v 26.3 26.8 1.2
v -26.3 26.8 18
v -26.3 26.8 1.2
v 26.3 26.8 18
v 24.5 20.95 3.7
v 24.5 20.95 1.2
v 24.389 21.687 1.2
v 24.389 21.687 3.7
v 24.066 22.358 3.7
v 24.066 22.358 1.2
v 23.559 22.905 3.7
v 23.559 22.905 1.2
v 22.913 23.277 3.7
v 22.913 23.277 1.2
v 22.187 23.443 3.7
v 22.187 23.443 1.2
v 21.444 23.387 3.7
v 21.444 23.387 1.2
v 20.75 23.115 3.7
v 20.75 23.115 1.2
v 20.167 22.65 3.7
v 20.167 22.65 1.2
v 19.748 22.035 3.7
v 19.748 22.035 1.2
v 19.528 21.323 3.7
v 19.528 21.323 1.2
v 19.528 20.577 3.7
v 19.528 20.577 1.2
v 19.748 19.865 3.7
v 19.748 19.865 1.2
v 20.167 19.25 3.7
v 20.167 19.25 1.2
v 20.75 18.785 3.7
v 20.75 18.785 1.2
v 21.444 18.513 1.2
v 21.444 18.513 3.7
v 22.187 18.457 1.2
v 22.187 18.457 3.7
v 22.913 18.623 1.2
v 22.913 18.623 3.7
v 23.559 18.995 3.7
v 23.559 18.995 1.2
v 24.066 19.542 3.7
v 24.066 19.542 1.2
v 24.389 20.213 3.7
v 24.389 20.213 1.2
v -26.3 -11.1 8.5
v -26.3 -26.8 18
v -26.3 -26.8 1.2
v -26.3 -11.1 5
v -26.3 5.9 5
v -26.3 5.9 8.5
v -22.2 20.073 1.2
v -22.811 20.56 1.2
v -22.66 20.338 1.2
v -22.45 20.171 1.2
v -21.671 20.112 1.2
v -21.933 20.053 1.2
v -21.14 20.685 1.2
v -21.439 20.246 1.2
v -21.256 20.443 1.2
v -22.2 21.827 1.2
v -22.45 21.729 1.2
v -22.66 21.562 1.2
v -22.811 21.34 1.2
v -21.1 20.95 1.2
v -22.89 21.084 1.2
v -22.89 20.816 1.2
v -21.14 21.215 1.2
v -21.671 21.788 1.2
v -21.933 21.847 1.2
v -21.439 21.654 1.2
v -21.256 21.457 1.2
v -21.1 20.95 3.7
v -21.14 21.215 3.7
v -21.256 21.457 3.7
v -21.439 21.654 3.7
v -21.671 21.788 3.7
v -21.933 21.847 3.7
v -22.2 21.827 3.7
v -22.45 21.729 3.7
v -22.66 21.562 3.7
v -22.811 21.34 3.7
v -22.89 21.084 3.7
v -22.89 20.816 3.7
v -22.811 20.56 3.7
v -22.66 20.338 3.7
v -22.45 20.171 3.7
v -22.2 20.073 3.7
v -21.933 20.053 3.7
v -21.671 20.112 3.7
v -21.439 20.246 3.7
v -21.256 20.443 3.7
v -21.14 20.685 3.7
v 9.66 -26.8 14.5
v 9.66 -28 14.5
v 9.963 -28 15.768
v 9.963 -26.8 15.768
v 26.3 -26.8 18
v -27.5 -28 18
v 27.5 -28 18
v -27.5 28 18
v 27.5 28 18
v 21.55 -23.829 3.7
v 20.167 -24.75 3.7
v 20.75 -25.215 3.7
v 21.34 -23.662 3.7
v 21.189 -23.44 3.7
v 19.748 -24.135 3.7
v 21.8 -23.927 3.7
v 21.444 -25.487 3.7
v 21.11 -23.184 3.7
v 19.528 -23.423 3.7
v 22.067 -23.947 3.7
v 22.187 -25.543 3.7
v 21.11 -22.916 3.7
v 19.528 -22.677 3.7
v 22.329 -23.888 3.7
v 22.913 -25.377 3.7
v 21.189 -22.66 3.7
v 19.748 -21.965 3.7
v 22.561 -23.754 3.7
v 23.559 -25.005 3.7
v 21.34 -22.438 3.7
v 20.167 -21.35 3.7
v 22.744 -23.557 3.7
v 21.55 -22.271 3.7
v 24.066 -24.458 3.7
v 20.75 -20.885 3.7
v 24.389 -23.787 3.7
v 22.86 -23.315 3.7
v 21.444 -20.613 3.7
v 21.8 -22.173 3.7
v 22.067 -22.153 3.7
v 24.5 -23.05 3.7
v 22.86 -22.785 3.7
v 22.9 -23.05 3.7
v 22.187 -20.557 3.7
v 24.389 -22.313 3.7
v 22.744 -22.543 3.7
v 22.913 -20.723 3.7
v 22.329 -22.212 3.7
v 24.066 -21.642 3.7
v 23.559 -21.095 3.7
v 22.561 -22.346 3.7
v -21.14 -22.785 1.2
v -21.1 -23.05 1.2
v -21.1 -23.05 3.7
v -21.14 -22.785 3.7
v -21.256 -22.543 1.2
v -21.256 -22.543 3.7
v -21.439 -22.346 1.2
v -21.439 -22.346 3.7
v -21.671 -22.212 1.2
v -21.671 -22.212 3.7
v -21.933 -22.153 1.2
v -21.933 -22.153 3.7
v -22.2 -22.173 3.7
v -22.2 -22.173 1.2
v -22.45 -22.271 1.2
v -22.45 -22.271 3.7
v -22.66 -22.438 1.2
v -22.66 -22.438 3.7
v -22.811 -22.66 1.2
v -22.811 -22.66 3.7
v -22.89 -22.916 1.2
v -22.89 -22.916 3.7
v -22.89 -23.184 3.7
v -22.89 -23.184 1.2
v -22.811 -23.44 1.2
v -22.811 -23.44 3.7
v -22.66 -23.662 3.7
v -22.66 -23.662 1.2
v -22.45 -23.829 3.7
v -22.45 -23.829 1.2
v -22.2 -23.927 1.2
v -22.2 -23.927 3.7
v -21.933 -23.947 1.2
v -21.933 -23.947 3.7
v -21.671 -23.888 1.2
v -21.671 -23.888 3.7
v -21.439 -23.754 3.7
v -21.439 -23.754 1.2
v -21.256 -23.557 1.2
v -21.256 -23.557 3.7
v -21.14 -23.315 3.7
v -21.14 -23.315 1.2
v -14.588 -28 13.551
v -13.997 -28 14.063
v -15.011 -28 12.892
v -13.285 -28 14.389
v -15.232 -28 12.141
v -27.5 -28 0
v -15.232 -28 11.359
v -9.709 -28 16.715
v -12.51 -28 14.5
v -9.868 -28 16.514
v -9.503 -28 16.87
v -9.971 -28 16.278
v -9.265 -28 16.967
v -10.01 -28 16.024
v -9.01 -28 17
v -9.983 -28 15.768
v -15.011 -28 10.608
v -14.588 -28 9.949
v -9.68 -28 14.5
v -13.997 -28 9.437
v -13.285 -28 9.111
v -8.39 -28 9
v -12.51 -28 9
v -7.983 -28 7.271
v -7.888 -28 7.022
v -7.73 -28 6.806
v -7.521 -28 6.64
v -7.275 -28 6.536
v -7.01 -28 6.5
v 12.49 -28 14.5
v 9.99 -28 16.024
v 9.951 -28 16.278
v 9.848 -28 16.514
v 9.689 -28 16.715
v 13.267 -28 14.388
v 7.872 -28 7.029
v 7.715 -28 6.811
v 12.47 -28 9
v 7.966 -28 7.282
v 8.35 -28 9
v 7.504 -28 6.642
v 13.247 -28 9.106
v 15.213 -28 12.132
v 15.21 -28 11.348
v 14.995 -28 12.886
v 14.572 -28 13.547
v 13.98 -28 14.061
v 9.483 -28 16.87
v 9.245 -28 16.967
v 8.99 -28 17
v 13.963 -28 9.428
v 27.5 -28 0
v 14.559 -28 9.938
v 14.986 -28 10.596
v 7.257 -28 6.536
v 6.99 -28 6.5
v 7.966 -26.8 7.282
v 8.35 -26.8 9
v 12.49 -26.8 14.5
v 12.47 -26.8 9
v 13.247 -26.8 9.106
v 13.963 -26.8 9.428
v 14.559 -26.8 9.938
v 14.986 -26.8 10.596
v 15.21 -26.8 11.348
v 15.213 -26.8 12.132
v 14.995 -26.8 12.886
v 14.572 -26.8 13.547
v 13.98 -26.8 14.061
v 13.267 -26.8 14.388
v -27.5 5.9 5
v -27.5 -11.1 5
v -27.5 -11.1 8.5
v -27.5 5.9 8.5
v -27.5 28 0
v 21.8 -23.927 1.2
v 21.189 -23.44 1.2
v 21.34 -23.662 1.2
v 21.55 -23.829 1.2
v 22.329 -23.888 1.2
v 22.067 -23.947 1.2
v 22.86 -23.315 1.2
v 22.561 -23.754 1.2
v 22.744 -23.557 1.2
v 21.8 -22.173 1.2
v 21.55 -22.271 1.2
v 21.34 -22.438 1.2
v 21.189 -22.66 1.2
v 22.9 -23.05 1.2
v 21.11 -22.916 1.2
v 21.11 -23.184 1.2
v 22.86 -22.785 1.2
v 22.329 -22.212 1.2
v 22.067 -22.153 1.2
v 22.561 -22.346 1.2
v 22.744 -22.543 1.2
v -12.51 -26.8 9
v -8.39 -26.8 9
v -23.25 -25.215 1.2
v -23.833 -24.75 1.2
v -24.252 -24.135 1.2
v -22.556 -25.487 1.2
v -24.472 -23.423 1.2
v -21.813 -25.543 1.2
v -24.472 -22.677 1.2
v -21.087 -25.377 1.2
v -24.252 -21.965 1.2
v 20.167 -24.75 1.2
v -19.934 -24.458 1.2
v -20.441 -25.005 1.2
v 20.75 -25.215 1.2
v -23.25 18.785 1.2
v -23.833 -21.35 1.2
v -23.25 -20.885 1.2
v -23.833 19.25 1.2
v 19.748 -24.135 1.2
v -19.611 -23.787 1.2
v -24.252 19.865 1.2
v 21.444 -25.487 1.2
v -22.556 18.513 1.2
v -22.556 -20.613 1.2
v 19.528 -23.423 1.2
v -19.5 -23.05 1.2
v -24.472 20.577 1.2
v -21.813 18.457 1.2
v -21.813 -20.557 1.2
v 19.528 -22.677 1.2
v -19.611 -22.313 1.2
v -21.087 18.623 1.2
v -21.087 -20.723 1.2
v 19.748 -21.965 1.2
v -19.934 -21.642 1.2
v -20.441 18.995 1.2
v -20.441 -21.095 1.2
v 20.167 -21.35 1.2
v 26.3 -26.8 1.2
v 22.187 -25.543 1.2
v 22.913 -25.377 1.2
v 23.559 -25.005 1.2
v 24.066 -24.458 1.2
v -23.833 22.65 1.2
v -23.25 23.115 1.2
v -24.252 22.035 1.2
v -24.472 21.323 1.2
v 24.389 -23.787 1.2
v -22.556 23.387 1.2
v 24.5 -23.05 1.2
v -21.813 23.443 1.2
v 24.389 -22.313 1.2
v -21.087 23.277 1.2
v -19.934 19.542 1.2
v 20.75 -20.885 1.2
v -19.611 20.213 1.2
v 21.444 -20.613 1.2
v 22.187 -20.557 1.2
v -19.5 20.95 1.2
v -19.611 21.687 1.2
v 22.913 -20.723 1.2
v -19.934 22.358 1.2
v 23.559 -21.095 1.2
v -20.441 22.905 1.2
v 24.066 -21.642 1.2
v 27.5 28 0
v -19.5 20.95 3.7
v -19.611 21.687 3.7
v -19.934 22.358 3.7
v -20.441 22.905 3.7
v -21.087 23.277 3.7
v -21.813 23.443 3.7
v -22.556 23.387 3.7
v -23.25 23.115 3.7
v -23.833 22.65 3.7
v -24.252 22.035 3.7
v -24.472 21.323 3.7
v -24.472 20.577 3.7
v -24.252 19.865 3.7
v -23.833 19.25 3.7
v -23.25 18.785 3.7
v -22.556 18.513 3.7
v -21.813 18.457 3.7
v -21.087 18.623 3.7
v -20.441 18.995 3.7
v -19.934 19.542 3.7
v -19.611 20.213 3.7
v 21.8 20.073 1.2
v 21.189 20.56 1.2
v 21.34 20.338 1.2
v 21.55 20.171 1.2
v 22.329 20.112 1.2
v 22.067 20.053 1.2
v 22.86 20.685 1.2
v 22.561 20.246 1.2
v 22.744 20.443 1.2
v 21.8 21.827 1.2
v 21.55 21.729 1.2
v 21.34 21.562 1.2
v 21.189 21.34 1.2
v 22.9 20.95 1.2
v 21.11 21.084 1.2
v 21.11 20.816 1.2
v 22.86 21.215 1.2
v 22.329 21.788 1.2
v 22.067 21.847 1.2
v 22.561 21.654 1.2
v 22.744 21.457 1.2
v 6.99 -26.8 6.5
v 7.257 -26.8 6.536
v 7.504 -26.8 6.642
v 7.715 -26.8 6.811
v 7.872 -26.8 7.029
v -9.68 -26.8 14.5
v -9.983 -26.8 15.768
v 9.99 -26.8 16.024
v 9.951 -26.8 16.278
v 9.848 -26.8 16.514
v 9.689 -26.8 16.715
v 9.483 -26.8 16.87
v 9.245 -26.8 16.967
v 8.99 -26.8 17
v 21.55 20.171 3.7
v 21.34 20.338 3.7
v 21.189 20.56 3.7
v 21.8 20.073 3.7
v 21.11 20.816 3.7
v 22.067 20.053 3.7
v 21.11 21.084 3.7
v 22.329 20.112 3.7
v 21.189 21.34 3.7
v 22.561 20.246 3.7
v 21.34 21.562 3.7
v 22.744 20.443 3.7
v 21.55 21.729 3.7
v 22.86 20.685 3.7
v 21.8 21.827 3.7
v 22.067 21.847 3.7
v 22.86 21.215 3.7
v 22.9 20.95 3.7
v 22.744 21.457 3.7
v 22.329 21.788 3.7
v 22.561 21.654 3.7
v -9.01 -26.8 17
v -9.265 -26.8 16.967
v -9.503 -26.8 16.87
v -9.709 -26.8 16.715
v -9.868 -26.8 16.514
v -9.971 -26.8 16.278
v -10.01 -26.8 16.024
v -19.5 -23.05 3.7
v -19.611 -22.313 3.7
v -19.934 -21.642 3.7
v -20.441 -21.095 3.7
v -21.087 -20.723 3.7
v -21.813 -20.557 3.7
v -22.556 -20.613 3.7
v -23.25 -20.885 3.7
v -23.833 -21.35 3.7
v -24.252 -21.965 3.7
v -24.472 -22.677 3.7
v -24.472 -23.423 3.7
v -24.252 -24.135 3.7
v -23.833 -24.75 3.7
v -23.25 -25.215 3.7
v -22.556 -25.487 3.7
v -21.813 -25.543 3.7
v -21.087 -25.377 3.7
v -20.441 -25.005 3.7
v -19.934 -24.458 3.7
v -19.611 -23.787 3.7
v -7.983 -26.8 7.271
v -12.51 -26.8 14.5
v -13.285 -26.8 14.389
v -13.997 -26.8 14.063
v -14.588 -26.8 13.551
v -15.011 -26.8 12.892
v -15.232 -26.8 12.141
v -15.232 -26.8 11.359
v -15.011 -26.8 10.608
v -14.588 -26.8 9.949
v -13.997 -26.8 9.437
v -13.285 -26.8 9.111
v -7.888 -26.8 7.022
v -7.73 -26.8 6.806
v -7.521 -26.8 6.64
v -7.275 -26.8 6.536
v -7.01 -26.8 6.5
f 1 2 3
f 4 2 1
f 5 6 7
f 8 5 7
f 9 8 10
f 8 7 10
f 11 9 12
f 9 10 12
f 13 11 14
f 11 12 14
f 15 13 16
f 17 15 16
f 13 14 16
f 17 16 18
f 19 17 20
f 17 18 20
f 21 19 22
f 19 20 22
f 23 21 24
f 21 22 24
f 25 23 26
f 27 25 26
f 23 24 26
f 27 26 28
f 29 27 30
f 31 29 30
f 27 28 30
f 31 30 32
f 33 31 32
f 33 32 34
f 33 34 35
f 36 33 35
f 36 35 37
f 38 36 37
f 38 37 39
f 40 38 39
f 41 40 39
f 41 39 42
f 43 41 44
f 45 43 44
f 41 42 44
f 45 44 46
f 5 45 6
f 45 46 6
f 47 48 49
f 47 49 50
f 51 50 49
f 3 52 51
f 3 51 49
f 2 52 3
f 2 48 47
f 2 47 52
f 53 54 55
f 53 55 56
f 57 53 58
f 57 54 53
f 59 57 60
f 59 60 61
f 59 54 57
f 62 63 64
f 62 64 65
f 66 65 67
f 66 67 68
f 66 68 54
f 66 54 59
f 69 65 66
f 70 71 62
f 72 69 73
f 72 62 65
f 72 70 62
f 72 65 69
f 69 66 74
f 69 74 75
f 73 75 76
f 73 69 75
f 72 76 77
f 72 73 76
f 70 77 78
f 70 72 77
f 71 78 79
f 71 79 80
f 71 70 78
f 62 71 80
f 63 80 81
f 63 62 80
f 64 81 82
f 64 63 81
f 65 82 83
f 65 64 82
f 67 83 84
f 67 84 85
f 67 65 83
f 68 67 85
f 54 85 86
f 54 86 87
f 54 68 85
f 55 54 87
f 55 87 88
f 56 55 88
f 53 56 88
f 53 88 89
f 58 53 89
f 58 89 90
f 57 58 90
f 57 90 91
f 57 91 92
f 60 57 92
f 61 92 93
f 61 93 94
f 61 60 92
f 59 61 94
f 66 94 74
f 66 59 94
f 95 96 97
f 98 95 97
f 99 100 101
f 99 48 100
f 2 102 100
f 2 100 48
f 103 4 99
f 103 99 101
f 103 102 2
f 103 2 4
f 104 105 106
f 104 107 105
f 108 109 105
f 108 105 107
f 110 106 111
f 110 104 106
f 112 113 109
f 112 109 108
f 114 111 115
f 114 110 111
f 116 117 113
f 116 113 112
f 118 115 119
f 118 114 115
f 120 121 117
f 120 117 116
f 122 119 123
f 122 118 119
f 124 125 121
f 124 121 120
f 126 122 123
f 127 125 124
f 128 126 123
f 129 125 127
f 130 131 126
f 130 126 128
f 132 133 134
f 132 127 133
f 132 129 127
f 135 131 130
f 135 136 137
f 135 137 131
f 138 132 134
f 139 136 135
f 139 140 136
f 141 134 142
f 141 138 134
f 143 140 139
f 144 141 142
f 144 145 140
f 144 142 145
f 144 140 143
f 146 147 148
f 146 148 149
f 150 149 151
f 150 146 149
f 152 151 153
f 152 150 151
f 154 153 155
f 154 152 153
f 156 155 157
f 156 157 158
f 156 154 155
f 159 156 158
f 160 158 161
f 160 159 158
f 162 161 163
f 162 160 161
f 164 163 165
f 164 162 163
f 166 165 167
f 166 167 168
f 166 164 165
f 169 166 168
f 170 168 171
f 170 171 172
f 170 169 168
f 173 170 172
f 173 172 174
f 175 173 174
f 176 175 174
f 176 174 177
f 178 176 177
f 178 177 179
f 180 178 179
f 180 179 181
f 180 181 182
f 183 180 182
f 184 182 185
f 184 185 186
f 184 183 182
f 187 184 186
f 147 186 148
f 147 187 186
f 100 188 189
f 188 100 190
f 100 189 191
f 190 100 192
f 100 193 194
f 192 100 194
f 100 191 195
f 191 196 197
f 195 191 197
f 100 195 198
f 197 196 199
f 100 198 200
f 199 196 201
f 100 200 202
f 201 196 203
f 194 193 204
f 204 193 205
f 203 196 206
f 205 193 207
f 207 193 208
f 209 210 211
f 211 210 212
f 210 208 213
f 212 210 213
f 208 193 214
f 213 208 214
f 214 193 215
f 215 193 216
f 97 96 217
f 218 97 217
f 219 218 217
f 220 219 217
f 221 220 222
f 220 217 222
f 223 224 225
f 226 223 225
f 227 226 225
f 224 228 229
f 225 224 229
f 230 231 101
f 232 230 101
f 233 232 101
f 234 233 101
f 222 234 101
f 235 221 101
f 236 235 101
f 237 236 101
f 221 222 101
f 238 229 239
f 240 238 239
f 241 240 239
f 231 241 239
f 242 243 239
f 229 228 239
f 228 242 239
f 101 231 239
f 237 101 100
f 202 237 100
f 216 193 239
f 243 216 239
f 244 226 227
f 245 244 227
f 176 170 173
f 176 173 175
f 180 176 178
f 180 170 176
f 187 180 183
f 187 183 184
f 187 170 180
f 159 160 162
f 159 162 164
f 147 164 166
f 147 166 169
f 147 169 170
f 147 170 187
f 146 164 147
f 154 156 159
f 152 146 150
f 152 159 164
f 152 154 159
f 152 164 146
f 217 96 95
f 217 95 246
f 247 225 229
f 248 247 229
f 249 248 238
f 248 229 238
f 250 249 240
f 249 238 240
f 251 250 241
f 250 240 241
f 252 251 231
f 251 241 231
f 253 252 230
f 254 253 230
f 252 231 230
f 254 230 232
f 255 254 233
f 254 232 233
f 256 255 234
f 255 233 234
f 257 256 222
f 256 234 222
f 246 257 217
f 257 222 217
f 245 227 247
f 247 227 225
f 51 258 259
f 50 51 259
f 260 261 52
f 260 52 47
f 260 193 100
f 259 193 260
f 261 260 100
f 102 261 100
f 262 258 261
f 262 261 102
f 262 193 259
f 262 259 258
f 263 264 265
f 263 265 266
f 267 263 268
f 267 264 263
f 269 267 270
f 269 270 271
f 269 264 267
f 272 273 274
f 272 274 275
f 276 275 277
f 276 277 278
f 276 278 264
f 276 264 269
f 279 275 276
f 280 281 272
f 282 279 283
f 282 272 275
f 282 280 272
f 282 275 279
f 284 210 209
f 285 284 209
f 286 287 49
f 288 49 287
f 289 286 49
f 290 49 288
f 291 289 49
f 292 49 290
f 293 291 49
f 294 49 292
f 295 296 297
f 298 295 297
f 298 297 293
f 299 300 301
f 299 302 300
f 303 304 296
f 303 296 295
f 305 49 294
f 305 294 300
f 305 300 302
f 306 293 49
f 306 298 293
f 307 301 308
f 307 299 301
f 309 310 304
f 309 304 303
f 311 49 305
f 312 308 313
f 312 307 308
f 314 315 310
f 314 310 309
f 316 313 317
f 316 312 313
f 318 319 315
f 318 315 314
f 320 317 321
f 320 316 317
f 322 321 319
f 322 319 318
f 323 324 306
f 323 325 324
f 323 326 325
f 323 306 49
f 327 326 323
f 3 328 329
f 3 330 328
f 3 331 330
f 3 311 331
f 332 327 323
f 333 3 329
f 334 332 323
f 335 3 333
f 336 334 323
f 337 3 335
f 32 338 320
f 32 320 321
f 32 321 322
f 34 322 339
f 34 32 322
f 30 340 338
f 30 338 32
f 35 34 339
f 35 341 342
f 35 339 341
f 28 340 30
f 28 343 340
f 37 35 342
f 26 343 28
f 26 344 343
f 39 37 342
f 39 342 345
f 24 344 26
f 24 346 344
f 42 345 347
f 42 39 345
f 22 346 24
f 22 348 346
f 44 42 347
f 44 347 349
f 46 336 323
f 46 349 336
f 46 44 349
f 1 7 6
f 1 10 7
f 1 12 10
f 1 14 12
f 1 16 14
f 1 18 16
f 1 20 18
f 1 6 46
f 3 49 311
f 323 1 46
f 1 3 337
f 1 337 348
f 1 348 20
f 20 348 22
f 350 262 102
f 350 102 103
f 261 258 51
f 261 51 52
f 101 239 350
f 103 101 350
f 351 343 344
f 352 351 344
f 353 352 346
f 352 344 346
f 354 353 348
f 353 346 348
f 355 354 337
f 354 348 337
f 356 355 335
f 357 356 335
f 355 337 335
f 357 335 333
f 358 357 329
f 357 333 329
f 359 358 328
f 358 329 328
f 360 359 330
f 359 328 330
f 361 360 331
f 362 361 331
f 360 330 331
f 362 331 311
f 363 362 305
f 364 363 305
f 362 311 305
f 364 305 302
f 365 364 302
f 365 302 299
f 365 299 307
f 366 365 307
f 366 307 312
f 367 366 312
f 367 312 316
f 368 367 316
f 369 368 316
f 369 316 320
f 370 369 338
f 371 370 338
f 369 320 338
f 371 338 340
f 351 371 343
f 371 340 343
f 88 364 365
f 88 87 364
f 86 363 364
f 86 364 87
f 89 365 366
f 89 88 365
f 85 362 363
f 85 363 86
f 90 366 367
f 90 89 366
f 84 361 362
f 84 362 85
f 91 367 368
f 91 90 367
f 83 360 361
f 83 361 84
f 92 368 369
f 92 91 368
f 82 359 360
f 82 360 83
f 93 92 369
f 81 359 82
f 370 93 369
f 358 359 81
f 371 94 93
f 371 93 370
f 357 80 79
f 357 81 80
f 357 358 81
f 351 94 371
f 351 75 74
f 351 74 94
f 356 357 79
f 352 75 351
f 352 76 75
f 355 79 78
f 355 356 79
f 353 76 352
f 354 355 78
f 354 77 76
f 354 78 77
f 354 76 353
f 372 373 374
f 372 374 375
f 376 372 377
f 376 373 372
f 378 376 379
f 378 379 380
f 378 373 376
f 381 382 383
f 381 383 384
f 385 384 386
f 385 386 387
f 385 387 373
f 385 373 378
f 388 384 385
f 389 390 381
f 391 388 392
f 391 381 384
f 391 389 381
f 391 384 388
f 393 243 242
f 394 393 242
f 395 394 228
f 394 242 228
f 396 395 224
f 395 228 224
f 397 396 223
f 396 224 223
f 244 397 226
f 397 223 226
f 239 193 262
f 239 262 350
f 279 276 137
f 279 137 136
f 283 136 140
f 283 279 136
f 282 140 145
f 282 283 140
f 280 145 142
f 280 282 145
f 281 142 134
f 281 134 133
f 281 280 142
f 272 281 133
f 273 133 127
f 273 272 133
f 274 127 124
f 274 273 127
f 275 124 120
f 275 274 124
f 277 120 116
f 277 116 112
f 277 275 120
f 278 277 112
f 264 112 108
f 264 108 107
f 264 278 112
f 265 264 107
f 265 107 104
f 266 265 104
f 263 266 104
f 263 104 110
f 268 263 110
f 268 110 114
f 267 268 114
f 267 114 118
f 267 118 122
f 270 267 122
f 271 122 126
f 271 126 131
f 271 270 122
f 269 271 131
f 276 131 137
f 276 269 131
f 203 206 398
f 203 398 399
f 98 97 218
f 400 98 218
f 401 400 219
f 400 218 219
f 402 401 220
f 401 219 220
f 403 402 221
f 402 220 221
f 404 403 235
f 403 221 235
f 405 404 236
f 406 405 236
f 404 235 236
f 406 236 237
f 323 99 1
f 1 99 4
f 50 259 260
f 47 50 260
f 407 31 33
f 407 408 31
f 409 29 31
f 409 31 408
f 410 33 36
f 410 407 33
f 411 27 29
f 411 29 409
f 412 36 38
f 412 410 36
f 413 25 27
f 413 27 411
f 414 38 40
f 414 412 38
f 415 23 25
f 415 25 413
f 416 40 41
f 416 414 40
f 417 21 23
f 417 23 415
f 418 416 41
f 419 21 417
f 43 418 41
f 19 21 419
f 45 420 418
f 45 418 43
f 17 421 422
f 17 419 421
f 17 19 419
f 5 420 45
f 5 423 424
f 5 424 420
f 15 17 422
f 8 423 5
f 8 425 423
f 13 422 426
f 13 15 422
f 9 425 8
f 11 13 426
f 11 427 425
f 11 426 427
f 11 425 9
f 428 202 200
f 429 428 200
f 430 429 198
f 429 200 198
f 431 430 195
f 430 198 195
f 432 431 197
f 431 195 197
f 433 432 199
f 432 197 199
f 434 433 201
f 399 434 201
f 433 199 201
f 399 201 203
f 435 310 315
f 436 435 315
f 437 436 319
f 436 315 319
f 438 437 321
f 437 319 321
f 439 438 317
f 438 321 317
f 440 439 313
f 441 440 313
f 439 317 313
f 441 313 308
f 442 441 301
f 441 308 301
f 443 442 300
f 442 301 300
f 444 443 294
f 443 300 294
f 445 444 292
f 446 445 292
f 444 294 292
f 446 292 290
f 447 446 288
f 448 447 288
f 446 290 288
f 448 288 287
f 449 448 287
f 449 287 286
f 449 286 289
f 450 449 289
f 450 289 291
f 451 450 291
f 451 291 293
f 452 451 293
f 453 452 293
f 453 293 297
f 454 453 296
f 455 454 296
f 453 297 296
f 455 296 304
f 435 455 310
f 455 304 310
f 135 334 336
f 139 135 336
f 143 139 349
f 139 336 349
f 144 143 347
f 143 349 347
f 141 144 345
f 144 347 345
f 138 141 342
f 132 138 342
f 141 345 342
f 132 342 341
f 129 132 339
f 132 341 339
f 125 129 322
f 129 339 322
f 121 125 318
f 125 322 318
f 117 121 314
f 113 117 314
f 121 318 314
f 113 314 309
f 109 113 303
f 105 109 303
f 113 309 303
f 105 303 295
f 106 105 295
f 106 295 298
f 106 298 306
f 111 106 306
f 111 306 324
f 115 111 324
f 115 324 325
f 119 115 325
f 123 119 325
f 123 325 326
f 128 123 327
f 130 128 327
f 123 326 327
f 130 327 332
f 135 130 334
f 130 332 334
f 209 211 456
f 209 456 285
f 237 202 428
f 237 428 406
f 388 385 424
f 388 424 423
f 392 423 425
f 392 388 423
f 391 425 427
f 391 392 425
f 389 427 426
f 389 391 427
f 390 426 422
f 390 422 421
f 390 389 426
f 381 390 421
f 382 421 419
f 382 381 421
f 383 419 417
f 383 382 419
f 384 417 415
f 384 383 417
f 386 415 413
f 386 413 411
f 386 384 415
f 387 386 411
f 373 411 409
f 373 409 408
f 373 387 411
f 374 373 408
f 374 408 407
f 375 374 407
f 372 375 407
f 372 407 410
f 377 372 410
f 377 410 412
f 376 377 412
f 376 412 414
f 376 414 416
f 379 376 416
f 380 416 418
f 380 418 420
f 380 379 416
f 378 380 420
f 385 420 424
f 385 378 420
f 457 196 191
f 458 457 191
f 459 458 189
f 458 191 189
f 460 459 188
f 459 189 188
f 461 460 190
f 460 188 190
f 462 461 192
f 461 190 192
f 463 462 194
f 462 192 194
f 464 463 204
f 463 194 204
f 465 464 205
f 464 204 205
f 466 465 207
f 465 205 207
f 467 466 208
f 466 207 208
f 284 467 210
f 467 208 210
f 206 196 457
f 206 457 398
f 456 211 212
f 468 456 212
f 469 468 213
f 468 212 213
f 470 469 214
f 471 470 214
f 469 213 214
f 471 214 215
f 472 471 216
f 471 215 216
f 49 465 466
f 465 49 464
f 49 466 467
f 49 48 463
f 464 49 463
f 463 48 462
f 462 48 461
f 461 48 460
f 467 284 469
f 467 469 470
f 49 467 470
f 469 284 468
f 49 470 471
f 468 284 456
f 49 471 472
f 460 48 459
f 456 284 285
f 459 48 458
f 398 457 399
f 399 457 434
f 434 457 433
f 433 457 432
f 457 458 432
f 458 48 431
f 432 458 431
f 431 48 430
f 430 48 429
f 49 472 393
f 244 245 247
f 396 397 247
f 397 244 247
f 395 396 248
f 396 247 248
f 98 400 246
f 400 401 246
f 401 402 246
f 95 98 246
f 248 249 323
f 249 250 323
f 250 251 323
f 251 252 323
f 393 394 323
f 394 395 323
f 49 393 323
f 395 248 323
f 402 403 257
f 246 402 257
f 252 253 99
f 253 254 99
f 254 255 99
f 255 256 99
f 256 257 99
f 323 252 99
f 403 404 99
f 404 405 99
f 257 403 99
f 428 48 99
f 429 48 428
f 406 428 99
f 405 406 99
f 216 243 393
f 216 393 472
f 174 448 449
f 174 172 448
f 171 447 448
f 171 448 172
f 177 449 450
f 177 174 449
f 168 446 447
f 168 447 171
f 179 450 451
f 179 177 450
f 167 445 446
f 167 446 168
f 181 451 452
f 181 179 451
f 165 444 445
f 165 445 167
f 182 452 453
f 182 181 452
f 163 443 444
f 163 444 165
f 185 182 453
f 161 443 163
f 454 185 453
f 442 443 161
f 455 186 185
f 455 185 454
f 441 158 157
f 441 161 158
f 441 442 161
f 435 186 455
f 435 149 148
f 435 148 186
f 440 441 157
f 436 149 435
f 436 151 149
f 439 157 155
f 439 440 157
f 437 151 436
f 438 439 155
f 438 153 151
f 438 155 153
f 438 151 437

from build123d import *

# Parameters (mm, degrees)
SKETCH105_W     = 55
SKETCH105_H     = 56
PAD075_DEPTH    = 18
SKETCH012_W     = 52.6
SKETCH012_H     = 53.6
POCKET028_DEPTH = 16.8
POCKET029_DEPTH = 1.2
SKETCH014_W     = 17
SKETCH014_H     = 3.5
POCKET030_DEPTH = 1.2
SKETCH015_R     = 2.5
SKETCH015_R_2   = 0.9
PAD010_DEPTH    = 2.5


with BuildPart() as part:
    # Sketch105 → Pad075 (new body)
    with BuildSketch(Plane.XY):
        Rectangle(SKETCH105_W, SKETCH105_H)
    extrude(amount=PAD075_DEPTH)

    # Sketch012 (on Face6 of Pad075) → Pocket028 (cut)
    with BuildSketch(Plane.XY.offset(18)):
        Rectangle(SKETCH012_W, SKETCH012_H)
    extrude(amount=-POCKET028_DEPTH, mode=Mode.SUBTRACT)

    # Sketch013 (on Face6 of Pocket028) → Pocket029 (cut)
    with BuildSketch(Plane.XZ.offset(28)):
        with BuildLine():
            ThreePointArc((12.47, 9.000073), (15.239982, 11.74), (12.49, 14.5))
            Line((9.66, 14.5), (12.49, 14.5))
            Line((9.66, 14.5), (9.962666, 15.767791))
            ThreePointArc((9.962666, 15.767791), (9.774923, 16.619593), (8.99, 17))
            Line((-9.01, 17), (8.99, 17))
            ThreePointArc((-9.01, 17), (-9.794923, 16.619593), (-9.982666, 15.767791))
            Line((-9.68, 14.5), (-9.982666, 15.767791))
            Line((-12.51, 14.5), (-9.68, 14.5))
            ThreePointArc((-12.51, 14.5), (-15.26, 11.75), (-12.51, 9))
            Line((-12.51, 9), (-8.39, 9))
            Line((-7.983449, 7.271094), (-8.39, 9))
            ThreePointArc((-7.983449, 7.271094), (-7.630924, 6.716129), (-7.01, 6.5))
            Line((6.99, 6.5), (-7.01, 6.5))
            ThreePointArc((6.99, 6.5), (7.615236, 6.719564), (7.965913, 7.281839))
            Line((7.965913, 7.281839), (8.35, 9))
            Line((8.35, 9), (12.47, 9.000073))
        make_face()
    extrude(amount=-POCKET029_DEPTH, mode=Mode.SUBTRACT)

    # Sketch014 (on Face2 of Pocket029) → Pocket030 (cut)
    with BuildSketch(Plane(origin=(-27.5, 0, 0), x_dir=(0, -1, 0), z_dir=(-1, 0, 0))):
        with Locations((2.6, 6.75)):
            Rectangle(SKETCH014_W, SKETCH014_H)
    extrude(amount=-POCKET030_DEPTH, mode=Mode.SUBTRACT)

    # Sketch015 (on Face31 of Pocket030) → Pad010 (join)
    with BuildSketch(Plane.XY.offset(1.2)):
        with Locations((22, -23.05)):
            Circle(SKETCH015_R)
        with Locations((22, -23.05)):
            Circle(SKETCH015_R_2, mode=Mode.SUBTRACT)
        with Locations((-22, -23.05)):
            Circle(SKETCH015_R)
        with Locations((-22, -23.05)):
            Circle(SKETCH015_R_2, mode=Mode.SUBTRACT)
        with Locations((22, 20.95)):
            Circle(SKETCH015_R)
        with Locations((22, 20.95)):
            Circle(SKETCH015_R_2, mode=Mode.SUBTRACT)
        with Locations((-22, 20.95)):
            Circle(SKETCH015_R)
        with Locations((-22, 20.95)):
            Circle(SKETCH015_R_2, mode=Mode.SUBTRACT)
    extrude(amount=PAD010_DEPTH)


solid = part.part
